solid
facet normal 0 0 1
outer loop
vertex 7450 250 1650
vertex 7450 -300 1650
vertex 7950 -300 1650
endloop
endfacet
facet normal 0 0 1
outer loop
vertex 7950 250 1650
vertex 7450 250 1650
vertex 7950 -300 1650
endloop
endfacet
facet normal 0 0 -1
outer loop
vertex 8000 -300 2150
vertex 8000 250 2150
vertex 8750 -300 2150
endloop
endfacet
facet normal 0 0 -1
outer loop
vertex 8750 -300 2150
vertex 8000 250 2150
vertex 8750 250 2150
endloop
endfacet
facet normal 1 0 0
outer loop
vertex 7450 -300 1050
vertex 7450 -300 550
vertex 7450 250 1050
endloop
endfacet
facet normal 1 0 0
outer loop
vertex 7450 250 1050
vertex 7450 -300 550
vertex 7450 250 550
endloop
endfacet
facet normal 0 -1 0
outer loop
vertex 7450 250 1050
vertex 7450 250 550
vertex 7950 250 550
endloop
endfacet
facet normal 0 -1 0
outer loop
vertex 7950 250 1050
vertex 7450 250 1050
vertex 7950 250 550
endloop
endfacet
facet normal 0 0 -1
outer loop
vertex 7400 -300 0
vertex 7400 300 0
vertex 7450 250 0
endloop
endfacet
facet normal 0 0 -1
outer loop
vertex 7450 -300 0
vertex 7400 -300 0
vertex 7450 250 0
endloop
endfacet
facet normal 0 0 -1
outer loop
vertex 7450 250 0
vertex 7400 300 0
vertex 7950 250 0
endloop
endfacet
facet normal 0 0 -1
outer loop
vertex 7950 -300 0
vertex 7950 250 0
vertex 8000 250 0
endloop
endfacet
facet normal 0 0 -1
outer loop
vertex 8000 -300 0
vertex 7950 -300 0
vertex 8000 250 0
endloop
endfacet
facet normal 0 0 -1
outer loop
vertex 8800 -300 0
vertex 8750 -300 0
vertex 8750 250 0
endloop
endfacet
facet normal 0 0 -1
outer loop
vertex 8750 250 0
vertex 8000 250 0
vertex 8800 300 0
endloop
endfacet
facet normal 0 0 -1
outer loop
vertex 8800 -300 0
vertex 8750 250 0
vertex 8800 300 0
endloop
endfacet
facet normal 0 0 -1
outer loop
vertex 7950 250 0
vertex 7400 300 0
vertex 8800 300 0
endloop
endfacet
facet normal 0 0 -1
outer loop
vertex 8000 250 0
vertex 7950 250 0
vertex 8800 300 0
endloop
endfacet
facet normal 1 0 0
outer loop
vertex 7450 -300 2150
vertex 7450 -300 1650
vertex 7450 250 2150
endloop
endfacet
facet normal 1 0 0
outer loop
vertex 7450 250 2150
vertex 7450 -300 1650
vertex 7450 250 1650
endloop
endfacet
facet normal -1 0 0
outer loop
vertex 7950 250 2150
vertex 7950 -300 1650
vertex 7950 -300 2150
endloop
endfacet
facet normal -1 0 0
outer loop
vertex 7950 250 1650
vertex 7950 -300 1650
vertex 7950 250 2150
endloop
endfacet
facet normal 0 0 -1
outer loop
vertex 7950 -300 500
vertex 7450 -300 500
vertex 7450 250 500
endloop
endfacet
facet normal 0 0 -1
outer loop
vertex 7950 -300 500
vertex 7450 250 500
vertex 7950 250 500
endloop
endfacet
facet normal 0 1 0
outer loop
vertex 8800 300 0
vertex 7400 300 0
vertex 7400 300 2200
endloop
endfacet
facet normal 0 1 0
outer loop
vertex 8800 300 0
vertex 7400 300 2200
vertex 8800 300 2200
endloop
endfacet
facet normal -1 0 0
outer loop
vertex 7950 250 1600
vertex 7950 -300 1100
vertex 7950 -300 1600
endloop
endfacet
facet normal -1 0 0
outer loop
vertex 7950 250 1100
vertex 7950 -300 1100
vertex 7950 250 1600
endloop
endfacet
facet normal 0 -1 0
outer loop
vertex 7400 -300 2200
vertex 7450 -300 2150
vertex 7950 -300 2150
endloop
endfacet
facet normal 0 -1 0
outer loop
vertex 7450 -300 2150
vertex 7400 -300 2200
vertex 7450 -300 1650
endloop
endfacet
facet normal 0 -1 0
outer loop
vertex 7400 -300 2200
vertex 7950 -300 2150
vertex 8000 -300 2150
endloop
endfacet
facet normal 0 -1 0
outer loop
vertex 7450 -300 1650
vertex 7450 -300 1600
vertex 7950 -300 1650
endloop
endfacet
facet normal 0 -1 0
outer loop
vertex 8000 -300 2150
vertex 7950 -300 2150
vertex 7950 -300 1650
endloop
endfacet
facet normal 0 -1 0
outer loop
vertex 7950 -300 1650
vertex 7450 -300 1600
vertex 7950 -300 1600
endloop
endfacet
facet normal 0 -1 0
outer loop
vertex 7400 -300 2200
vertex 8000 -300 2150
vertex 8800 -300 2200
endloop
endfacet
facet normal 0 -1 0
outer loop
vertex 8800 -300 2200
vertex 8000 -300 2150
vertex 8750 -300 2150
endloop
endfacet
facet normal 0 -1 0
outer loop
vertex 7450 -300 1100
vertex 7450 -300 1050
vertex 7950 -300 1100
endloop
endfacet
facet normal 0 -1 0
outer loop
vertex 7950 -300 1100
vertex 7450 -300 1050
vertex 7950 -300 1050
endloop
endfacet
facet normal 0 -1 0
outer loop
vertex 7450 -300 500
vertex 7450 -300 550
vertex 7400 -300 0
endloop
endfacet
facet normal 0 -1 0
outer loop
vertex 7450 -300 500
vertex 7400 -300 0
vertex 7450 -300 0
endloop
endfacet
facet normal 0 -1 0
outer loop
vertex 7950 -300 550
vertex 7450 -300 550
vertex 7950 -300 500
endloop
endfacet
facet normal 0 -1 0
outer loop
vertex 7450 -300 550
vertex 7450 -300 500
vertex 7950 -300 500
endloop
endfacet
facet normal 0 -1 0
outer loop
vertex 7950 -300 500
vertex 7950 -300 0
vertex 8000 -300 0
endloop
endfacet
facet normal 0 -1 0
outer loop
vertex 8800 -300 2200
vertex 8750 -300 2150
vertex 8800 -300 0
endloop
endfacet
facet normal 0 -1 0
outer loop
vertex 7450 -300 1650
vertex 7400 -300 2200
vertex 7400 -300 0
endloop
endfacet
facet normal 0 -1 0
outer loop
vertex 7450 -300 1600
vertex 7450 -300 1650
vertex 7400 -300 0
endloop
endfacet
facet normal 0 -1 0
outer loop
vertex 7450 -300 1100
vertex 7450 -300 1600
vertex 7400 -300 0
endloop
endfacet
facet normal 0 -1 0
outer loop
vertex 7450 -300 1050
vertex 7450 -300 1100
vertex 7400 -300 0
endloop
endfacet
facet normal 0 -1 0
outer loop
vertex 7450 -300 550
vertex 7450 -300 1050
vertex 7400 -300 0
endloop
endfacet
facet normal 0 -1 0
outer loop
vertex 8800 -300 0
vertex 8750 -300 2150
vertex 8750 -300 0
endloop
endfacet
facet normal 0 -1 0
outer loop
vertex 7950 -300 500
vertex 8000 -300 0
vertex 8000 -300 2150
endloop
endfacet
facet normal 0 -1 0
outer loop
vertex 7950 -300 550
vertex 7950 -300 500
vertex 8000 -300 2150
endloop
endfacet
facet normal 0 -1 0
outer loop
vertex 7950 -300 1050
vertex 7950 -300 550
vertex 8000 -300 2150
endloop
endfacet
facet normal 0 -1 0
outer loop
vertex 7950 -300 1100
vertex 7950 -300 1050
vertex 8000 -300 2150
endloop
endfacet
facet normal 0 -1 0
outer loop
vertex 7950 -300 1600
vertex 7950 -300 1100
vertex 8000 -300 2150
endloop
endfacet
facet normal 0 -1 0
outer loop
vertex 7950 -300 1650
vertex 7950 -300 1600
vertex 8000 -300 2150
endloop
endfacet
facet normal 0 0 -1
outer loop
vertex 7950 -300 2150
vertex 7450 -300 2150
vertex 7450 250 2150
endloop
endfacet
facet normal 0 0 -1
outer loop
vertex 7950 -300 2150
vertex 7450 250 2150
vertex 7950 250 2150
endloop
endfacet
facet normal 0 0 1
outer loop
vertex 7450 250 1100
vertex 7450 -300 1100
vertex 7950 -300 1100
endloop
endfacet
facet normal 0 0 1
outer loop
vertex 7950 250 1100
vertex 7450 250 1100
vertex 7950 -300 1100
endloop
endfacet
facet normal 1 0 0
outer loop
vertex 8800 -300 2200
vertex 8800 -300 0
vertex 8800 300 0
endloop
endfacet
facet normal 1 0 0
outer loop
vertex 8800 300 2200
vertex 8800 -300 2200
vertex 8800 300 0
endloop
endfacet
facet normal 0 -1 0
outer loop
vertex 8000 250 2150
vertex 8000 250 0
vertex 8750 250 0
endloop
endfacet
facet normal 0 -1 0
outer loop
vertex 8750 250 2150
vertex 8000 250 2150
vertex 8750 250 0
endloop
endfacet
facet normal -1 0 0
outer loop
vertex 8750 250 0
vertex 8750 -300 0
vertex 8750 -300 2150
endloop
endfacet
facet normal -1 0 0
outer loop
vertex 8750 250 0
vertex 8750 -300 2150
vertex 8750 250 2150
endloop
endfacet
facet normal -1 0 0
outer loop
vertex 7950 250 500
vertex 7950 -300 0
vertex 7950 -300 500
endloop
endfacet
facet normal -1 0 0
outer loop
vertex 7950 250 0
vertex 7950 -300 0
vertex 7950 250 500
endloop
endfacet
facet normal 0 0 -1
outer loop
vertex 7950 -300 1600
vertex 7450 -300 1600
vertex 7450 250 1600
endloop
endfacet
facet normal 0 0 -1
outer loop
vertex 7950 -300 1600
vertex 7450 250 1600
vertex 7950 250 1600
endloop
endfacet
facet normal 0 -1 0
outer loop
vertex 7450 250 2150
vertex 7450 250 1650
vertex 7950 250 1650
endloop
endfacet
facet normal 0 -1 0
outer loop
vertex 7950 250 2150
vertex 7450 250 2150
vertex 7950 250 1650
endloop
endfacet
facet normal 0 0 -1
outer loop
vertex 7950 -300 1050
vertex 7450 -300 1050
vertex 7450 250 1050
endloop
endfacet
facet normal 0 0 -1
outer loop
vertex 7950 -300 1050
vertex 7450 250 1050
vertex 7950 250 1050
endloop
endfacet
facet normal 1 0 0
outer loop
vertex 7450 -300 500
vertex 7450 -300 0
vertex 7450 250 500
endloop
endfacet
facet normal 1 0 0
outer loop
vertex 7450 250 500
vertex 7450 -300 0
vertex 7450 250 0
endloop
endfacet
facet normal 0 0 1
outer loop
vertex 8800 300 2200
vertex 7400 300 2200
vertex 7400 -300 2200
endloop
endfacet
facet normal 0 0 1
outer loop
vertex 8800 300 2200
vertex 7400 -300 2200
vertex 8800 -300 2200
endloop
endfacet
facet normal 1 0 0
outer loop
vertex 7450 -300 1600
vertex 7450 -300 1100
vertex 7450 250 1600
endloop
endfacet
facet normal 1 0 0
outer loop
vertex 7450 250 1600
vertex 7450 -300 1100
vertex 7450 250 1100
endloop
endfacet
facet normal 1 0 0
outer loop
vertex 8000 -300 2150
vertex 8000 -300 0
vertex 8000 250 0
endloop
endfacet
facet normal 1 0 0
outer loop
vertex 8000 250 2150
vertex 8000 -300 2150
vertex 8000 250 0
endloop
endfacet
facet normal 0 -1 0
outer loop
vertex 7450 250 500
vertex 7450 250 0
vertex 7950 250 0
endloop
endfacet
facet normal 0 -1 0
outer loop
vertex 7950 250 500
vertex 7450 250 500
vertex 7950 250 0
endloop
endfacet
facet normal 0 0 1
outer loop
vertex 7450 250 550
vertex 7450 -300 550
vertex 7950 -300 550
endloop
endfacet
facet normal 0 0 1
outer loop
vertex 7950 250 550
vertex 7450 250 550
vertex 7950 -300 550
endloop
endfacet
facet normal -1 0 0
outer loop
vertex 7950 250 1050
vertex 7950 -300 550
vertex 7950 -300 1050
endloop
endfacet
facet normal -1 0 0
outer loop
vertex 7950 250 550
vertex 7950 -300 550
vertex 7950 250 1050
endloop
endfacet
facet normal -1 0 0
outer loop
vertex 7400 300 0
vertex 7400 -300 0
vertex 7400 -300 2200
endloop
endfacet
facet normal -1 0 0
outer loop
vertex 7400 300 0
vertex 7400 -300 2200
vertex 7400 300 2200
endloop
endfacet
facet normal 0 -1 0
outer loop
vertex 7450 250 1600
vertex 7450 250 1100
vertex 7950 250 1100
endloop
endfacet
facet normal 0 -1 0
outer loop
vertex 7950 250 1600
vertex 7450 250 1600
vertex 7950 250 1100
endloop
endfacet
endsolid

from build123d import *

# Parameters (mm, degrees)
BOX3570_W        = 750
BOX3570_H        = 550
BOX3570_DEPTH    = 2150
BOX3572_W        = 500
BOX3572_H        = 550
BOX3572_DEPTH    = 500
ARRAY290_Z_COUNT = 4
ARRAY290_Z_PITCH = 550
BOX3571_W        = 1400
BOX3571_H        = 600
BOX3571_DEPTH    = 2200


with BuildPart() as box3570:
    # Box3570 → Box3570 (new body)
    with BuildSketch(Plane(origin=(8100, -300, 0), x_dir=(1, 0, 0), z_dir=(0, 0, 1))):
        with Locations((375, 275)):
            Rectangle(BOX3570_W, BOX3570_H)
    extrude(amount=BOX3570_DEPTH)


with BuildPart() as array290:
    # Box3572 → Box3572 (new body)
    with BuildSketch(Plane(origin=(7550, -300, 0), x_dir=(1, 0, 0), z_dir=(0, 0, 1))):
        with Locations((250, 275)):
            Rectangle(BOX3572_W, BOX3572_H)
    extrude(amount=BOX3572_DEPTH)

    # Array290 Z: Array290 ×4


with BuildPart() as array290_1:
    add(array290.part)
    with Locations(*[(0, 0, i * ARRAY290_Z_PITCH) for i in range(1, ARRAY290_Z_COUNT)]):
        add(array290.part)


with BuildPart() as cut006:
    # Box3571 → Box3571 (new body)
    with BuildSketch(Plane(origin=(7500, -300, 0), x_dir=(1, 0, 0), z_dir=(0, 0, 1))):
        with Locations((700, 300)):
            Rectangle(BOX3571_W, BOX3571_H)
    extrude(amount=BOX3571_DEPTH)

    # Cut007: cut Array290
    add(array290_1.part, mode=Mode.SUBTRACT)

    # Cut006: cut Box3570
    add(box3570.part, mode=Mode.SUBTRACT)


with BuildPart() as cut006_1:
    # Cut006 placement: moved
    add(cut006.part.moved(Location((-100, 0, 0))))


solid = cut006_1.part
